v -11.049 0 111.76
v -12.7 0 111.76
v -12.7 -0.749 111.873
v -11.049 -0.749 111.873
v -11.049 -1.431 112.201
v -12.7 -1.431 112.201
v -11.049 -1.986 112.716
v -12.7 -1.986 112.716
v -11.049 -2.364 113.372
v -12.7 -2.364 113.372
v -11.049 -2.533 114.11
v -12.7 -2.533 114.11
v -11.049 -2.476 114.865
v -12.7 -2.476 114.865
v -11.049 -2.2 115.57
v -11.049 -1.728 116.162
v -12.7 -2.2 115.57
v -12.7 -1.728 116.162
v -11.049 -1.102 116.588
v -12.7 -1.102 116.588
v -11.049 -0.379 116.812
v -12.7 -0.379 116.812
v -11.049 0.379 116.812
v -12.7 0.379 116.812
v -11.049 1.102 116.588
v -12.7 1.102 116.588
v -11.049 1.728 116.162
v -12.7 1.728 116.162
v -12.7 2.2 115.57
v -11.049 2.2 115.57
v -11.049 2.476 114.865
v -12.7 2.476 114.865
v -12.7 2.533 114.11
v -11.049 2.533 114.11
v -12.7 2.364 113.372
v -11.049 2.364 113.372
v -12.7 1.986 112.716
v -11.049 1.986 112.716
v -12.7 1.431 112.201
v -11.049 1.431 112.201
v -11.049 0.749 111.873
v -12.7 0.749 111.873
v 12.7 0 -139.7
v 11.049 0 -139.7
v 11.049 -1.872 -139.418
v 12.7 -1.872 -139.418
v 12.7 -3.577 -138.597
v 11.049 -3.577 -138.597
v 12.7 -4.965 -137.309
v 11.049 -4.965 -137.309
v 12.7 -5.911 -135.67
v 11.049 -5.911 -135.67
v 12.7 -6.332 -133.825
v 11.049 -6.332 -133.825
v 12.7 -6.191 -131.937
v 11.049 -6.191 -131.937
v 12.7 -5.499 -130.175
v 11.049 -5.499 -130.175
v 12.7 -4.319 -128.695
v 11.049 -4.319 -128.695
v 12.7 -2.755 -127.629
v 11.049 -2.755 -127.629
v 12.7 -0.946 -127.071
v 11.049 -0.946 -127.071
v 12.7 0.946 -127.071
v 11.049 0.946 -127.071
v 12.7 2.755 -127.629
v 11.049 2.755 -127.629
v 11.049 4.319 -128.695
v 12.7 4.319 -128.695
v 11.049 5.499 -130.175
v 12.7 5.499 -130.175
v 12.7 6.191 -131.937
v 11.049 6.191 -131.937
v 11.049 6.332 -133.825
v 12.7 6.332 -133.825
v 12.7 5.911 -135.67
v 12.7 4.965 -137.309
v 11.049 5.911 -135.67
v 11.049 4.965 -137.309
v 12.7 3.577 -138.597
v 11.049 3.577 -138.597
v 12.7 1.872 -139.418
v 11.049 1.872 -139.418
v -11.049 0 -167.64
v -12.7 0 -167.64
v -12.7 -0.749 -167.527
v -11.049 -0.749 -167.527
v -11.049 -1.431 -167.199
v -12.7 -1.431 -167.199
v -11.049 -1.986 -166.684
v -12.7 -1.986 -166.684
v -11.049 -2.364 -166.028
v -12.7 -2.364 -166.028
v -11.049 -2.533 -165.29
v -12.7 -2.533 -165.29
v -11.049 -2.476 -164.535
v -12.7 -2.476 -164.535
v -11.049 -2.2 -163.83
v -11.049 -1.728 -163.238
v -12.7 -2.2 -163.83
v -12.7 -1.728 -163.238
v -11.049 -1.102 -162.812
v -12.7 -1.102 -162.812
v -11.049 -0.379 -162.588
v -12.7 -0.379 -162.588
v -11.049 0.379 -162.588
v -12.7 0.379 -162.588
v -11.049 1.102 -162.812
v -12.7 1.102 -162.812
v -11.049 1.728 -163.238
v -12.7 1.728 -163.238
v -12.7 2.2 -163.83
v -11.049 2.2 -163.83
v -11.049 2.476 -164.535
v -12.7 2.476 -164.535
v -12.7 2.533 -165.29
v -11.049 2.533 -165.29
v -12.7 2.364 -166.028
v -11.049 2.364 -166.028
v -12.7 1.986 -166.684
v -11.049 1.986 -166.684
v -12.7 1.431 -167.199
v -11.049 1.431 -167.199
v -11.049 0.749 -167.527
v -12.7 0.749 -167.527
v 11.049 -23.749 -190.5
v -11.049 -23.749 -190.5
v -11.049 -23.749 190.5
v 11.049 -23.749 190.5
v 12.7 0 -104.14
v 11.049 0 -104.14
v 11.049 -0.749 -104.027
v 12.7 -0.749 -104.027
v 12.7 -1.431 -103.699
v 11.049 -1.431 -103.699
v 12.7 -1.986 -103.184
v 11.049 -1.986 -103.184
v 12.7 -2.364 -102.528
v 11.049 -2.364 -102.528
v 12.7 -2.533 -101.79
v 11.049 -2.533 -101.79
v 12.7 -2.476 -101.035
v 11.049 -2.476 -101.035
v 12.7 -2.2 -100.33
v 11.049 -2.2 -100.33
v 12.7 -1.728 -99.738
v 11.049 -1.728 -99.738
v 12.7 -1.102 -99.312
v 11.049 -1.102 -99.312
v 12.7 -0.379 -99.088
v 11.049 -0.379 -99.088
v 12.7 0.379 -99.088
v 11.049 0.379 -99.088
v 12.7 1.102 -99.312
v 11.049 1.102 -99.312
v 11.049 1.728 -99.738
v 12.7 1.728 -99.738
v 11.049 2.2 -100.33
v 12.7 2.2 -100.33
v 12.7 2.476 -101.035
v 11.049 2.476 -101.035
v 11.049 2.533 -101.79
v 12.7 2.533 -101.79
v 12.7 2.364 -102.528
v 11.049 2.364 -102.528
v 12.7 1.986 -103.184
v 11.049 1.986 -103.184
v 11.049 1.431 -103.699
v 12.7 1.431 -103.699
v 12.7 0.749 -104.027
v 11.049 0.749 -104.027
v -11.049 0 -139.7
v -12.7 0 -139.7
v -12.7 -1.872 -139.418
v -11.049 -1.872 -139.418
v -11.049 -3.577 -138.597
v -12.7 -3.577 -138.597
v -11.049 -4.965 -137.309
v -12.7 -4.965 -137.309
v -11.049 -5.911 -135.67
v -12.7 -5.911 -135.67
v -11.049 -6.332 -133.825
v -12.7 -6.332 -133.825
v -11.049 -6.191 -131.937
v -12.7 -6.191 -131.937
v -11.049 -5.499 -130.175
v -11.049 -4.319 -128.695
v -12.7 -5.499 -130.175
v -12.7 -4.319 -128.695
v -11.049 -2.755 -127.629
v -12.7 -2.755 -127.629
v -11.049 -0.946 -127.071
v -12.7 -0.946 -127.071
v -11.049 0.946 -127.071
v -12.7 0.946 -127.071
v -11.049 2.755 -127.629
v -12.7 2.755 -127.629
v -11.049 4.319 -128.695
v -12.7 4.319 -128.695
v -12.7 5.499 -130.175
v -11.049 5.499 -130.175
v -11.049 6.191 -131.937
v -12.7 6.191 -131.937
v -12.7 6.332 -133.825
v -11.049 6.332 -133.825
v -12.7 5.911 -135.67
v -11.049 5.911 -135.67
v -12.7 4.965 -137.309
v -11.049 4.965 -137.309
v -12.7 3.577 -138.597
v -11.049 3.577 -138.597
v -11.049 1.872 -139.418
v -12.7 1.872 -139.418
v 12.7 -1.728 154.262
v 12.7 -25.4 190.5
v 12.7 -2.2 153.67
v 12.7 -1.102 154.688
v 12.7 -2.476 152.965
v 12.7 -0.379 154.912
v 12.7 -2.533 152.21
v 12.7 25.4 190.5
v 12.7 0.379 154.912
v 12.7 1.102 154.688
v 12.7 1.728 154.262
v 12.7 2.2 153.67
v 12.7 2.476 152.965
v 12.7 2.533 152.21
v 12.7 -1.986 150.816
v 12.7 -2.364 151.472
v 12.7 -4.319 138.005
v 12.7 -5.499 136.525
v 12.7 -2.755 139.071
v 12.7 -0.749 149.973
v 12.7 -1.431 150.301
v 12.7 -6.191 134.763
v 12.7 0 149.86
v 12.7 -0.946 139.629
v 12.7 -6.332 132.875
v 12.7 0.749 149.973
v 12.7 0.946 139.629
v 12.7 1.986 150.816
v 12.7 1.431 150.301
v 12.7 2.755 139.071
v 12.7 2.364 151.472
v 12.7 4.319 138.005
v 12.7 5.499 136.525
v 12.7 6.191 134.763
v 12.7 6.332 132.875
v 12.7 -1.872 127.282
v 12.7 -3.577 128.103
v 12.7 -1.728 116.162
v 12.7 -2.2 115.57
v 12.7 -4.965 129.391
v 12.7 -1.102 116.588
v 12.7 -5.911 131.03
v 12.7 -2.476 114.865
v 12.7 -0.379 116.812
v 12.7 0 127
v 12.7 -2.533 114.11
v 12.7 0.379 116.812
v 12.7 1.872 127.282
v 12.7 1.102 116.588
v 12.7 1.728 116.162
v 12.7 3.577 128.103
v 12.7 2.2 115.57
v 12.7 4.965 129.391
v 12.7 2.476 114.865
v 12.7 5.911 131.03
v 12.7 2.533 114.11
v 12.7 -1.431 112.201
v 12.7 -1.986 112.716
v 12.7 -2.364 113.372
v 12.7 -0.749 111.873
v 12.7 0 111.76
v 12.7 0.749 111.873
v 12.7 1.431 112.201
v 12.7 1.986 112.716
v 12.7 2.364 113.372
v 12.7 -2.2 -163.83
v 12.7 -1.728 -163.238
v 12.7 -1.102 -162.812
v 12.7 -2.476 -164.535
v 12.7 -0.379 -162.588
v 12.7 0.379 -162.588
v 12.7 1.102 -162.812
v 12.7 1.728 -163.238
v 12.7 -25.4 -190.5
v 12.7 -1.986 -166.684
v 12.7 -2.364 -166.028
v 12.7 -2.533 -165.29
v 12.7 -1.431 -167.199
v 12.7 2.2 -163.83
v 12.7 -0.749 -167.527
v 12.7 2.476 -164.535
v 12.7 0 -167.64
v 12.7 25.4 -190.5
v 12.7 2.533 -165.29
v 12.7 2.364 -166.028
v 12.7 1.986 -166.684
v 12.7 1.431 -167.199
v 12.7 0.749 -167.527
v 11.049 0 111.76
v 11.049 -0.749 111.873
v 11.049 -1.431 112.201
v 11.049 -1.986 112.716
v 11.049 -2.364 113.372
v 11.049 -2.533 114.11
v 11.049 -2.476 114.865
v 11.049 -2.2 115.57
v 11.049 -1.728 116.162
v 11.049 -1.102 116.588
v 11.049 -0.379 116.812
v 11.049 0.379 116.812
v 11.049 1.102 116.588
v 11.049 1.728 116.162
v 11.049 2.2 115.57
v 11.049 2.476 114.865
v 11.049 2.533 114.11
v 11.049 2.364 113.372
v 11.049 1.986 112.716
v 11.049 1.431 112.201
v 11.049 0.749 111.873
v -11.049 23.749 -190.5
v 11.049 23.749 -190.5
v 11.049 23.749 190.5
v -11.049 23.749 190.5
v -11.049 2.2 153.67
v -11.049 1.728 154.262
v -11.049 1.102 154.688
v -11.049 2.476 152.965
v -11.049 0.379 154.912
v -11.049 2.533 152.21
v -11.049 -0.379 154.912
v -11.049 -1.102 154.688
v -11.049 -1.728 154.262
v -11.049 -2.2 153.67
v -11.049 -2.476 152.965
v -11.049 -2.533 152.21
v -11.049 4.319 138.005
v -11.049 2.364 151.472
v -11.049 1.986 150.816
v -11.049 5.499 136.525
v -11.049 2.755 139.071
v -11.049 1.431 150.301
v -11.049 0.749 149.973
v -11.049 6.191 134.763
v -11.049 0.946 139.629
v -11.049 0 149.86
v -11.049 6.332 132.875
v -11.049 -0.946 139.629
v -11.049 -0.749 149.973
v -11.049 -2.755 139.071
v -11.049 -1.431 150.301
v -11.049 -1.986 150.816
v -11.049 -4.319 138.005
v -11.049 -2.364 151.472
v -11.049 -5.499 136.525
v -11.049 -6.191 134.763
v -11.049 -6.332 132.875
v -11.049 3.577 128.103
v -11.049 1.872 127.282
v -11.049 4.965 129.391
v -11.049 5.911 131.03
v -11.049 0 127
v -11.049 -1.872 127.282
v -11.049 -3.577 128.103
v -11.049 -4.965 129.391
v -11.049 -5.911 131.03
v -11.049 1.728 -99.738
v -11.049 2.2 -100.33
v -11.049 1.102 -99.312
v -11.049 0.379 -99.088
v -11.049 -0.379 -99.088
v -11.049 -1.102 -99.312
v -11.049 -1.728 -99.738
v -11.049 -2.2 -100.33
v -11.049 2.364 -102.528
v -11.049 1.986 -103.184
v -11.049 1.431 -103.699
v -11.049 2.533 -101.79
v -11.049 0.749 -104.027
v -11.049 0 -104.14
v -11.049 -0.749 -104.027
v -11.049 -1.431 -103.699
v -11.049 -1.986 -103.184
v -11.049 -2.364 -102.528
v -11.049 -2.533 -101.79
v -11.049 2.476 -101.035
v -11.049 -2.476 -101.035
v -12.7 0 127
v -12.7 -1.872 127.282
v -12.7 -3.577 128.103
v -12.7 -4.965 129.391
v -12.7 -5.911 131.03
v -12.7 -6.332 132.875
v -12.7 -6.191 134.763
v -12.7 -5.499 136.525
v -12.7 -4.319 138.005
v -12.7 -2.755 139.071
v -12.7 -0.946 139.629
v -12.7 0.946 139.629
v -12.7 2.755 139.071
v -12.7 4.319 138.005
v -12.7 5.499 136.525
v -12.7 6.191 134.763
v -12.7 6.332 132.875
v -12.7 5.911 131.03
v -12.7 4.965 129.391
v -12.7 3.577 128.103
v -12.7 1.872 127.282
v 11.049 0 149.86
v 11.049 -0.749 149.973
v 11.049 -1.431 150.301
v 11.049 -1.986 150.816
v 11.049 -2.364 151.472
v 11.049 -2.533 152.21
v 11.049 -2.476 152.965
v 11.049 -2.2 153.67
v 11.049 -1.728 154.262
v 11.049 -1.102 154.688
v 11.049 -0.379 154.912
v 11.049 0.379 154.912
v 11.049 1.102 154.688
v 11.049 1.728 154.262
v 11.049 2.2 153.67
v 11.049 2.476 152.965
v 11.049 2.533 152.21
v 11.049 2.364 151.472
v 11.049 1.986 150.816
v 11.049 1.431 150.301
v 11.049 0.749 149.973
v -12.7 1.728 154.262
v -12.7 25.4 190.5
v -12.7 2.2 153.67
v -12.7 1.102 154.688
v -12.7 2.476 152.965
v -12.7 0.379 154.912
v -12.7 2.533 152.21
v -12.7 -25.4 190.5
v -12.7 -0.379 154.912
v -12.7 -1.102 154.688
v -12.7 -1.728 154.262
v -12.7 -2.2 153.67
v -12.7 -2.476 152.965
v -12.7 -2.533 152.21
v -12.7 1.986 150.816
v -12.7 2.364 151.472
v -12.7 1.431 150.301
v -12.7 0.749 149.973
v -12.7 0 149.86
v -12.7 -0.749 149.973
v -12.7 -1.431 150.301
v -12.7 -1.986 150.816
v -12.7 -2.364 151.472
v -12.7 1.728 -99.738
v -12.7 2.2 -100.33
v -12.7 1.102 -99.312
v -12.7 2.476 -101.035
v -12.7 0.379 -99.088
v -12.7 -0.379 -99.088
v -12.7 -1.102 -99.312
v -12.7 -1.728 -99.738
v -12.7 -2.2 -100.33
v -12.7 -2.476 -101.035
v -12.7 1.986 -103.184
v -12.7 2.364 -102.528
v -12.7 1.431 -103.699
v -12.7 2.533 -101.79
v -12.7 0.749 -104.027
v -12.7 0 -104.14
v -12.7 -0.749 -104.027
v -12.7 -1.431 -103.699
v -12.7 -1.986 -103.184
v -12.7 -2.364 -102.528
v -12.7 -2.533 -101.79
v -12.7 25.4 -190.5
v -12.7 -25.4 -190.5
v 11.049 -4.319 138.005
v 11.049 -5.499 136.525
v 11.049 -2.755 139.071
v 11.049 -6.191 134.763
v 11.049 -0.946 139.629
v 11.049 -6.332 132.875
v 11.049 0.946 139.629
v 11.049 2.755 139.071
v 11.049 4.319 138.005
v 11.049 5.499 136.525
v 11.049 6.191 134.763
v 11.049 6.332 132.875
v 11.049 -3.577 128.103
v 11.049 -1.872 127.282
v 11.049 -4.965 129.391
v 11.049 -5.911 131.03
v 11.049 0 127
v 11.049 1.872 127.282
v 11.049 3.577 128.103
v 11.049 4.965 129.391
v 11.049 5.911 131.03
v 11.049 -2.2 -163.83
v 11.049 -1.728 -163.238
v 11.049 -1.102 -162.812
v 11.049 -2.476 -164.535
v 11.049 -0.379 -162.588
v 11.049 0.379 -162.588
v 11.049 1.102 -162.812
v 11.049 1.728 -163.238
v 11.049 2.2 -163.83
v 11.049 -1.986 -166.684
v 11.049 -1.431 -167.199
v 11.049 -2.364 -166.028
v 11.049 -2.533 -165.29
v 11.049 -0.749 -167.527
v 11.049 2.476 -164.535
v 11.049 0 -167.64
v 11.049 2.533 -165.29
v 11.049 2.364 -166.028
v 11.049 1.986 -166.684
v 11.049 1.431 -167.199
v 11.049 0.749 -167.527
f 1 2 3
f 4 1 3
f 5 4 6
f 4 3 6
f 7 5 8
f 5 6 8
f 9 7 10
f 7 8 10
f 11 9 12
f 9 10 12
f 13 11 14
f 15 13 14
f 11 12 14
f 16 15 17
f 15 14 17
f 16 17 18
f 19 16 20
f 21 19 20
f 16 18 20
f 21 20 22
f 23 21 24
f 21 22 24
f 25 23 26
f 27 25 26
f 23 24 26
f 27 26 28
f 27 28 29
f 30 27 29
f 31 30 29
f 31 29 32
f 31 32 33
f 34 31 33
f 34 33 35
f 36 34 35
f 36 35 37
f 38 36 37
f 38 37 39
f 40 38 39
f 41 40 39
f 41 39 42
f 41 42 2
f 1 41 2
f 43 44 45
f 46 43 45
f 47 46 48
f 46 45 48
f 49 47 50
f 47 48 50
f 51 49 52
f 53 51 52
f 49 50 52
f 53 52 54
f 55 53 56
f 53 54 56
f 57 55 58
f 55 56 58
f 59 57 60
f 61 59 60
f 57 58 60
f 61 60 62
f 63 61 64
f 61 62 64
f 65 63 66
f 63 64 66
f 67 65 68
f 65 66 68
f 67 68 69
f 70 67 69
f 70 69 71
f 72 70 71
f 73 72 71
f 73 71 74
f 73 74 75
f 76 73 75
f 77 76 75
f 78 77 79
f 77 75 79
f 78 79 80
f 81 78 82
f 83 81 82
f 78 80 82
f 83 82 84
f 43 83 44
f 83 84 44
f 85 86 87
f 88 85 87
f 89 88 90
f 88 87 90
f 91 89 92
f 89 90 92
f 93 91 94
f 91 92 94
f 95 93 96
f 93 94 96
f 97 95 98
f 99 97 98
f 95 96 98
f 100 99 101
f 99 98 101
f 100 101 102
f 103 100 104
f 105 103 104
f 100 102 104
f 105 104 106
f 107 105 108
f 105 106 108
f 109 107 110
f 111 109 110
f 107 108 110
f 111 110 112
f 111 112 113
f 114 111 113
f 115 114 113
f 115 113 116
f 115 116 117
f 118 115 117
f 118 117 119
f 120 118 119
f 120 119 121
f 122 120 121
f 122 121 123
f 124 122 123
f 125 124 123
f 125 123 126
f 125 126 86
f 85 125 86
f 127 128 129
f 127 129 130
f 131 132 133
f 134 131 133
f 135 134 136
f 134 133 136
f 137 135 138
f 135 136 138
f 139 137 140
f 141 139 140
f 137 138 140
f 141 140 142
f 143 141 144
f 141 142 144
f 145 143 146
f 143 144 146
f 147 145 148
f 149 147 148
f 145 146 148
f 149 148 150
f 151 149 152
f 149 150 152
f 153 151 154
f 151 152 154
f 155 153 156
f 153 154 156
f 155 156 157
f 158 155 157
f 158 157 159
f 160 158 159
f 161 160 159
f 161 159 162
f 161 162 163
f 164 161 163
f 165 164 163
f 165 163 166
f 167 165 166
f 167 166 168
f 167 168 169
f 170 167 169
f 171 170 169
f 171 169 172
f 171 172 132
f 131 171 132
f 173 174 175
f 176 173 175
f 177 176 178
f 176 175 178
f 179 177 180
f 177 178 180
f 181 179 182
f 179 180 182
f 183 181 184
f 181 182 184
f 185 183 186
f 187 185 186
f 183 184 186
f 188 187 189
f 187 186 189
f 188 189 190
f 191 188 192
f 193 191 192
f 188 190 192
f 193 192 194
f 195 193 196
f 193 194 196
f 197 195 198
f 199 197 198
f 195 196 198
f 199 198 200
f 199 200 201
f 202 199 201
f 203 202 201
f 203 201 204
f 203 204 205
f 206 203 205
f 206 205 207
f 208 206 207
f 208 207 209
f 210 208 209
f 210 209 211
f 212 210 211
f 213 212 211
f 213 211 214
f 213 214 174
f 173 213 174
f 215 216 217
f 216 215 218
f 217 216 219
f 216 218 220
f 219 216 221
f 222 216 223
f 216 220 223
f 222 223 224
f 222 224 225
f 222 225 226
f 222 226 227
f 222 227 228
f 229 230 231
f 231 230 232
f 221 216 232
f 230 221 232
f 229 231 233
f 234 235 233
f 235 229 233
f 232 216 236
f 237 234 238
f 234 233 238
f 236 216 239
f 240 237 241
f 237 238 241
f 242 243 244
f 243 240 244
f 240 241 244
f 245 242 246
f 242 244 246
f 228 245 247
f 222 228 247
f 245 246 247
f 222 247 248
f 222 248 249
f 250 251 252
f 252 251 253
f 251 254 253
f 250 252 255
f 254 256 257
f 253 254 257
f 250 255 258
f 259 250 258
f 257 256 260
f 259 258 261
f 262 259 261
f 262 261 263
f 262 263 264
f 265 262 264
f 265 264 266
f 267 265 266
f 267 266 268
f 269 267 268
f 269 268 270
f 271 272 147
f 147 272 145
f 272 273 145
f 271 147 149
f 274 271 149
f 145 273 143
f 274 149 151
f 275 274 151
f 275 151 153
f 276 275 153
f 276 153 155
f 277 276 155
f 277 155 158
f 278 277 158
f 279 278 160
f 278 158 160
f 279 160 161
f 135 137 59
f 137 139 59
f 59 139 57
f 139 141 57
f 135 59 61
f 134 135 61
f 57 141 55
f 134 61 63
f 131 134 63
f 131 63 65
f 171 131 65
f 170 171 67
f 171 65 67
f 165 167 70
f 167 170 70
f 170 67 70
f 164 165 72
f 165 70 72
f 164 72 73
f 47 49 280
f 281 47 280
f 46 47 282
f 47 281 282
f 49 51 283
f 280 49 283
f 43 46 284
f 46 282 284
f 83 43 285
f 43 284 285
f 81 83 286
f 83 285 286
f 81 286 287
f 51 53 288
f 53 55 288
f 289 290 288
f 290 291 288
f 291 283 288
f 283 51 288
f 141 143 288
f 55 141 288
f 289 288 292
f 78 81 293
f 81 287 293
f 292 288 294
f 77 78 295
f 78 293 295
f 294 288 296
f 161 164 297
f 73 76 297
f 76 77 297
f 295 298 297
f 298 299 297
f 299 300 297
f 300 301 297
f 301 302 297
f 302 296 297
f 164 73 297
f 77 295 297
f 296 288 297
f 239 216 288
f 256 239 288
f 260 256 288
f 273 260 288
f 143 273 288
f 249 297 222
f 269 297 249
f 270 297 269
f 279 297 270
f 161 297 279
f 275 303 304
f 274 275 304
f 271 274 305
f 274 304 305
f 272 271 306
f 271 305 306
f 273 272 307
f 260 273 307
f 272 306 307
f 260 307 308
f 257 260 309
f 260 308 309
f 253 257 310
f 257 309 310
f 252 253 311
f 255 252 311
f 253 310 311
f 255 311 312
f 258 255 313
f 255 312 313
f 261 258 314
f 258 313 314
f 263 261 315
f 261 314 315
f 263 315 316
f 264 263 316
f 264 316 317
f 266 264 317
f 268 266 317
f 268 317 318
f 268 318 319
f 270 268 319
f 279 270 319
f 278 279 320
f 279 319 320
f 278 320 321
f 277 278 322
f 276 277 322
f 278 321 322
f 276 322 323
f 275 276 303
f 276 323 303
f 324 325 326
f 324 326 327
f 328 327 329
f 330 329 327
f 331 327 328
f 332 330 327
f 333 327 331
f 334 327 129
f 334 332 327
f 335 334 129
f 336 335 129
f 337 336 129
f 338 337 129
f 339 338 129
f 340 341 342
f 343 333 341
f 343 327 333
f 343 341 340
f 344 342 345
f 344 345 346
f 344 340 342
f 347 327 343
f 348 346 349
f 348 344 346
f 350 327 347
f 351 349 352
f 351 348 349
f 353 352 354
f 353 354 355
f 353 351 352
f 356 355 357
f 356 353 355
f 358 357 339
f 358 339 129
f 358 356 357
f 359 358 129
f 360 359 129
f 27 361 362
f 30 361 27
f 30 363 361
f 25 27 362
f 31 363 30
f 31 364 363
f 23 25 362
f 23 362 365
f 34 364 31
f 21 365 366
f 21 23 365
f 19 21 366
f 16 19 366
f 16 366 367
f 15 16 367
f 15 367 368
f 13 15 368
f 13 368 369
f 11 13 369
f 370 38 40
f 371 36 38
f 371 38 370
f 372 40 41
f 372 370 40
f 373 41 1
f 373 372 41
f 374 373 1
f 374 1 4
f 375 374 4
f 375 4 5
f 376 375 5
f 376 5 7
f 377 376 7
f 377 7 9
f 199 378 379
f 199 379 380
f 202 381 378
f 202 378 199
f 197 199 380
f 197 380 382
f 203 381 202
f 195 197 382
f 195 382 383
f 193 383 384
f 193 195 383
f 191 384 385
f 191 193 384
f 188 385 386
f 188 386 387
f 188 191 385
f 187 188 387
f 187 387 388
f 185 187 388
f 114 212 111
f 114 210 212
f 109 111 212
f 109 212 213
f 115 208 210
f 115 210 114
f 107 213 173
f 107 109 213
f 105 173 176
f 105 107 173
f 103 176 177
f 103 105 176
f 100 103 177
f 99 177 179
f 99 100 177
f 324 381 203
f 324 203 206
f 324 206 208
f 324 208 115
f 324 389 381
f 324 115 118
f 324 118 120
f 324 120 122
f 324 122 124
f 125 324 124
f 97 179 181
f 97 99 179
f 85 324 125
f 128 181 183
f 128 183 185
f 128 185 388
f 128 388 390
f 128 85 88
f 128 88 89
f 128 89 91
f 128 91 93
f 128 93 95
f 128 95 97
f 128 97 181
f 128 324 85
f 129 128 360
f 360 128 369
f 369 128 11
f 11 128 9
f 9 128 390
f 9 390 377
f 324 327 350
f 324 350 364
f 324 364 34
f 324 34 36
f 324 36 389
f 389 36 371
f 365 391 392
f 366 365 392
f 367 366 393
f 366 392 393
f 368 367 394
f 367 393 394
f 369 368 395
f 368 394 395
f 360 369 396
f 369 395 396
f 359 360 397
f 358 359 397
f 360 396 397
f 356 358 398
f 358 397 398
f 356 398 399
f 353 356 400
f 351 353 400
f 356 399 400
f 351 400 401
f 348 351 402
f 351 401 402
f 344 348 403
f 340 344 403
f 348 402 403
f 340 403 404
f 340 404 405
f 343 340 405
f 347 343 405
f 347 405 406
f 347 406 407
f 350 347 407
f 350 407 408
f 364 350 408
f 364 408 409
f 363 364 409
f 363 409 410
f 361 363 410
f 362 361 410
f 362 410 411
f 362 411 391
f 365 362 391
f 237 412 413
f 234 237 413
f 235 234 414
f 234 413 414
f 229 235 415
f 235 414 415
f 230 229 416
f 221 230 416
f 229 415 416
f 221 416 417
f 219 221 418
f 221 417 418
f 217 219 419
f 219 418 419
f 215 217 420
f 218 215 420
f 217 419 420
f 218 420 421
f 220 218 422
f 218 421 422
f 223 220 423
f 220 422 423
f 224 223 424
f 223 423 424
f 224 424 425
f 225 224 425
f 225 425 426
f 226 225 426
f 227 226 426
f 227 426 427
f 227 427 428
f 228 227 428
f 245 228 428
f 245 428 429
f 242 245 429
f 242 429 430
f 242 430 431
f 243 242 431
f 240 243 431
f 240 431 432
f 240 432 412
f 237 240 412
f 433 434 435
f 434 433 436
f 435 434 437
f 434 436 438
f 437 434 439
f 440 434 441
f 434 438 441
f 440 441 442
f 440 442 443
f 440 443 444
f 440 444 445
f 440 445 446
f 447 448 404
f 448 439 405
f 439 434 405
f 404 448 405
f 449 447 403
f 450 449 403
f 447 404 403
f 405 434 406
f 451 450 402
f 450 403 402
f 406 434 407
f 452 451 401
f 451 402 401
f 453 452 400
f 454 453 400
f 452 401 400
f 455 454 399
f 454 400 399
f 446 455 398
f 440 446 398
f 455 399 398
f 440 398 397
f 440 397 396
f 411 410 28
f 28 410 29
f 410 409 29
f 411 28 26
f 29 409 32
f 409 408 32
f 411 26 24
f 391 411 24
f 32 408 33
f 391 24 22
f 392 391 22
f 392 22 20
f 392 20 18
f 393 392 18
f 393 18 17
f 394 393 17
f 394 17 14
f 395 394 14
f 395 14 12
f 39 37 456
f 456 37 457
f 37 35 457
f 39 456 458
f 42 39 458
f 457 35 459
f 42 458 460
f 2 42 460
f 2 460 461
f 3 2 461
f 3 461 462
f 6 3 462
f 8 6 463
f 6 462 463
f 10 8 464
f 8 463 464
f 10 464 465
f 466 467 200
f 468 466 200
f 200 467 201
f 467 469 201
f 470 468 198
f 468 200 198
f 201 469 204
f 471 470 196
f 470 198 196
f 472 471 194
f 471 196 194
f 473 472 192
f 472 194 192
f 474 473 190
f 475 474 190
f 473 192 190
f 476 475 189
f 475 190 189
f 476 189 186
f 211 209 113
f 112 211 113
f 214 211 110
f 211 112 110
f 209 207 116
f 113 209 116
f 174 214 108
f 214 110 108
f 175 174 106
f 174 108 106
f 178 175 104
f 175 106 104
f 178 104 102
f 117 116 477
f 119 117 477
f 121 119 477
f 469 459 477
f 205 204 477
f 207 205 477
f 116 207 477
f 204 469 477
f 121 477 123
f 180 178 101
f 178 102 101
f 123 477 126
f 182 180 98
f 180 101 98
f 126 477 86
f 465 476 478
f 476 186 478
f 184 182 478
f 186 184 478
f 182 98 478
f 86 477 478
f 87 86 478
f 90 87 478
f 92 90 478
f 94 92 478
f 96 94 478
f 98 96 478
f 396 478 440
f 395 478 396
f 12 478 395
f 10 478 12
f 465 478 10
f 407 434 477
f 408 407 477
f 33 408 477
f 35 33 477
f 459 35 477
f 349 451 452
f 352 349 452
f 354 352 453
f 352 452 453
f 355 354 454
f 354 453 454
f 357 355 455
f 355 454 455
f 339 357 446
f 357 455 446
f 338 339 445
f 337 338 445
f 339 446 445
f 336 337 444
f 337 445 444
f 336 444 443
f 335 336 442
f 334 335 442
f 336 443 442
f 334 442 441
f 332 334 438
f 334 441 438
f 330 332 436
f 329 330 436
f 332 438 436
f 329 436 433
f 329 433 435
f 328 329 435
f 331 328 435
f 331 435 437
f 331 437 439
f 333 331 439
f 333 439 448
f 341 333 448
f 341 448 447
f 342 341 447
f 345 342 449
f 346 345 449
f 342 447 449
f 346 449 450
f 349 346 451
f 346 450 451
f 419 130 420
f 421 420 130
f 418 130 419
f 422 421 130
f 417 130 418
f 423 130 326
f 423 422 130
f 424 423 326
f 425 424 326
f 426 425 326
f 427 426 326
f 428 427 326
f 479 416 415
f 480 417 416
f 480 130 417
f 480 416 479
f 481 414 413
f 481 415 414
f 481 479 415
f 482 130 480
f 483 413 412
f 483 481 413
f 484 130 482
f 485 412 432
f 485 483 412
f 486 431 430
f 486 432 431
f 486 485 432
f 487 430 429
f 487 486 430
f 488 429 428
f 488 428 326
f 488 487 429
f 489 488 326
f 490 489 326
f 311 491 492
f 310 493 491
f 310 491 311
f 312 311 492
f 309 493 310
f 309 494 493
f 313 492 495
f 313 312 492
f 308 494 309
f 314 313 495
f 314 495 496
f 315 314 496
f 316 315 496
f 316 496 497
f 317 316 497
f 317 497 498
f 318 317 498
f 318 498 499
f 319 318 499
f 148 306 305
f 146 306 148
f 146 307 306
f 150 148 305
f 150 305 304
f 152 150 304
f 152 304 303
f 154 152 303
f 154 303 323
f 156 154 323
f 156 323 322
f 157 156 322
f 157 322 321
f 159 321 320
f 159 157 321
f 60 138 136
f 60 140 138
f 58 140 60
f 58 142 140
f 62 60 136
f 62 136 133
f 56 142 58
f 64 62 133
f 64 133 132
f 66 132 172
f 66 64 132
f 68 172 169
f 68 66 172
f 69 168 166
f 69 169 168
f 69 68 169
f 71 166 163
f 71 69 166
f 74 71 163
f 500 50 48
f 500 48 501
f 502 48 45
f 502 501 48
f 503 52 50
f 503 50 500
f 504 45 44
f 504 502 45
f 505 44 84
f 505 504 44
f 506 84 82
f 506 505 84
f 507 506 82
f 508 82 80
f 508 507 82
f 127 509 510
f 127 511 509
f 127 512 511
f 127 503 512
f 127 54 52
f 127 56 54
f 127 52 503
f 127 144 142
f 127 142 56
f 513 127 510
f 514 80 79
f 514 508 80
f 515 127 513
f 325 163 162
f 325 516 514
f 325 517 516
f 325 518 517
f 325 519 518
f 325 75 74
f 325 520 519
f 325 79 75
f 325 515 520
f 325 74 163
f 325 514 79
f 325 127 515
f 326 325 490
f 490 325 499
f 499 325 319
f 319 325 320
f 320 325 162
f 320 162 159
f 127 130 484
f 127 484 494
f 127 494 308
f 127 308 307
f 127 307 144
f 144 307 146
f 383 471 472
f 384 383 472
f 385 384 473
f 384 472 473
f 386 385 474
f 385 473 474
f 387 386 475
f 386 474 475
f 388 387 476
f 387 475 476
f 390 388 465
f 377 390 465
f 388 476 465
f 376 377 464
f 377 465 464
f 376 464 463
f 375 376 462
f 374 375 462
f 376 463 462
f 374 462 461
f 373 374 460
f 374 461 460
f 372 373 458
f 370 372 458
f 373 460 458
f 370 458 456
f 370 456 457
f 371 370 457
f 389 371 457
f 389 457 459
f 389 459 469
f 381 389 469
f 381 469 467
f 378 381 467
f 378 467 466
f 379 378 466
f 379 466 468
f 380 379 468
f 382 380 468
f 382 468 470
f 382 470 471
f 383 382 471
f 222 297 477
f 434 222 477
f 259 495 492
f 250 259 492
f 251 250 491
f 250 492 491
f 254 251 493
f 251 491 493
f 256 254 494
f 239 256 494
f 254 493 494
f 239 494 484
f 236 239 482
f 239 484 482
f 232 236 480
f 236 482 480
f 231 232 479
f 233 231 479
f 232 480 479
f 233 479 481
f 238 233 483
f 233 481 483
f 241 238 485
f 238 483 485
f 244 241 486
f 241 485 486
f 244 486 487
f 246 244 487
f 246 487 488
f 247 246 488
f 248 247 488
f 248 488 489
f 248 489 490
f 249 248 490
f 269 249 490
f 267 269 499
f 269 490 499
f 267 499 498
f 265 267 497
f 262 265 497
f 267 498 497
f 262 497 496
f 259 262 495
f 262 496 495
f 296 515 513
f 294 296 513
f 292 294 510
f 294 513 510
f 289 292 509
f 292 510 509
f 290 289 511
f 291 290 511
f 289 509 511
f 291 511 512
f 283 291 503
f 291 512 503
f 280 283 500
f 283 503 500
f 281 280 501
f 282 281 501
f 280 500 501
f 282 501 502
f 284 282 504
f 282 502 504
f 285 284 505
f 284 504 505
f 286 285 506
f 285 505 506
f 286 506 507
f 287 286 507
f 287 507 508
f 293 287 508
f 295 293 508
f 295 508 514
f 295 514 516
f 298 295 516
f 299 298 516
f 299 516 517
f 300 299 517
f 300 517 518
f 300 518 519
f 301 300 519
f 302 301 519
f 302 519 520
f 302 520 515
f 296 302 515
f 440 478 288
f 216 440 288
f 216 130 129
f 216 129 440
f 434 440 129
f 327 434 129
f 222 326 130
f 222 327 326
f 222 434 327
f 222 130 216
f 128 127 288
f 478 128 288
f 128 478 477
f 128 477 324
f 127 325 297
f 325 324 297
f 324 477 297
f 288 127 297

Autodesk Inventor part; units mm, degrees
ref_plane "YZ Plane" through (0, 0, 0) normal (1, 0, 0) x (0, 1, 0)
ref_plane "XY Plane" through (0, 0, 0) normal (0, 0, 1) x (1, 0, 0)
sketch "Sketch1" plane through (0, 0, 0) normal (0, 0, 1) x (1, 0, 0)
  line L0 (-12.7, -25.4) -> (12.7, -25.4)
  line L1 (12.7, -25.4) -> (12.7, 25.4)
  line L2 (12.7, 25.4) -> (-12.7, 25.4)
  line L3 (-12.7, 25.4) -> (-12.7, -25.4)
  line L4 (-12.7, -25.4) -> (12.7, 25.4) construction
  line L5 (12.7, -25.4) -> (-12.7, 25.4) construction
  line L6 (-11.049, -23.749) -> (11.049, -23.749)
  line L7 (11.049, -23.749) -> (11.049, 23.749)
  line L8 (11.049, 23.749) -> (-11.049, 23.749)
  line L9 (-11.049, 23.749) -> (-11.049, -23.749)
  line L10 (-11.049, -23.749) -> (11.049, 23.749) construction
  line L11 (11.049, -23.749) -> (-11.049, 23.749) construction
  point P0 (0, 0)
  dimension "d0" = 25.4
  dimension "d1" = 50.8
  dimension "d4" = 22.098
  dimension "d5" = 47.498
extrude "Extrusion2" add sketch "Sketch1" along normal mid plane 381
sketch "Sketch3" plane through (12.7, -25.4, 190.5) normal (1, 0, 0) x (0, 0, -1)
  line L0 (381, 50.8) -> (0, 50.8) projected
  line L1 (0, 0) -> (0, 50.8) projected
  line L2 (381, 0) -> (0, 0) projected
  line L3 (381, 50.8) -> (381, 0) projected
  circle A0 centre (57.15, 25.4) radius 6.35
  point P0 (190.5, 25.4)
  dimension "d22" = 12.7
  dimension "d23" = 57.15
  dimension "d24" = 25.4
hole "Hole2" at (12.7, 0, 133.35) direction (-1, 0, 0) diameter 12.7 end through all
sketch "Sketch4" plane through (12.7, -25.4, 190.5) normal (1, 0, 0) x (0, 0, -1)
  circle A0 centre (57.15, 25.4) radius 6.35 projected
  line L0 (381, 50.8) -> (0, 50.8) projected
  line L1 (0, 0) -> (0, 50.8) projected
  line L2 (381, 0) -> (0, 0) projected
  line L3 (381, 50.8) -> (381, 0) projected
  point P0 (190.5, 25.4)
  point P1 (323.85, 25.4)
  dimension "d32" = 57.15
  dimension "d33" = 25.4
hole "Hole3" at (12.7, 0, -133.35) direction (-1, 0, 0) diameter 12.7 end through all
sketch "Sketch5" plane through (12.7, -25.4, 190.5) normal (1, 0, 0) x (0, 0, -1)
  circle A0 centre (323.85, 25.4) radius 6.35 projected
  circle A1 centre (57.15, 25.4) radius 6.35 projected
  line L0 (381, 50.8) -> (0, 50.8) projected
  line L1 (0, 0) -> (0, 50.8) projected
  line L2 (381, 0) -> (0, 0) projected
  line L3 (381, 50.8) -> (381, 0) projected
  point P0 (190.5, 25.4)
  point P1 (355.6, 25.4)
  point P2 (292.1, 25.4)
  dimension "d41" = 63.5
  dimension "d42" = 31.75
hole "Hole4" at (12.7, 0, -101.6) at (12.7, 0, -165.1) direction (-1, 0, 0) diameter 5.08 end through all
sketch "Sketch6" plane through (12.7, -25.4, 190.5) normal (1, 0, 0) x (0, 0, -1)
  circle A0 centre (292.1, 25.4) radius 2.54 projected
  circle A1 centre (355.6, 25.4) radius 2.54 projected
  circle A2 centre (323.85, 25.4) radius 6.35 projected
  circle A3 centre (57.15, 25.4) radius 6.35 projected
  line L0 (381, 50.8) -> (0, 50.8) projected
  line L1 (0, 0) -> (0, 50.8) projected
  line L2 (381, 0) -> (0, 0) projected
  line L3 (381, 50.8) -> (381, 0) projected
  circle A4 centre (38.1, 25.4) radius 2.54
  line L4 (57.15, 31.75) -> (57.15, 19.05) construction
  circle A5 centre (76.2, 25.4) radius 2.54
  point P0 (190.5, 25.4)
  dimension "d53" = 5.08
  dimension "d54" = 19.05
hole "Hole5" at (12.7, 0, 152.4) at (12.7, 0, 114.3) direction (-1, 0, 0) diameter 5.08 end through all
properties part number "Steel 4130 1x2in. Tubing, t=.065in.,L=15in." material "Steel"
